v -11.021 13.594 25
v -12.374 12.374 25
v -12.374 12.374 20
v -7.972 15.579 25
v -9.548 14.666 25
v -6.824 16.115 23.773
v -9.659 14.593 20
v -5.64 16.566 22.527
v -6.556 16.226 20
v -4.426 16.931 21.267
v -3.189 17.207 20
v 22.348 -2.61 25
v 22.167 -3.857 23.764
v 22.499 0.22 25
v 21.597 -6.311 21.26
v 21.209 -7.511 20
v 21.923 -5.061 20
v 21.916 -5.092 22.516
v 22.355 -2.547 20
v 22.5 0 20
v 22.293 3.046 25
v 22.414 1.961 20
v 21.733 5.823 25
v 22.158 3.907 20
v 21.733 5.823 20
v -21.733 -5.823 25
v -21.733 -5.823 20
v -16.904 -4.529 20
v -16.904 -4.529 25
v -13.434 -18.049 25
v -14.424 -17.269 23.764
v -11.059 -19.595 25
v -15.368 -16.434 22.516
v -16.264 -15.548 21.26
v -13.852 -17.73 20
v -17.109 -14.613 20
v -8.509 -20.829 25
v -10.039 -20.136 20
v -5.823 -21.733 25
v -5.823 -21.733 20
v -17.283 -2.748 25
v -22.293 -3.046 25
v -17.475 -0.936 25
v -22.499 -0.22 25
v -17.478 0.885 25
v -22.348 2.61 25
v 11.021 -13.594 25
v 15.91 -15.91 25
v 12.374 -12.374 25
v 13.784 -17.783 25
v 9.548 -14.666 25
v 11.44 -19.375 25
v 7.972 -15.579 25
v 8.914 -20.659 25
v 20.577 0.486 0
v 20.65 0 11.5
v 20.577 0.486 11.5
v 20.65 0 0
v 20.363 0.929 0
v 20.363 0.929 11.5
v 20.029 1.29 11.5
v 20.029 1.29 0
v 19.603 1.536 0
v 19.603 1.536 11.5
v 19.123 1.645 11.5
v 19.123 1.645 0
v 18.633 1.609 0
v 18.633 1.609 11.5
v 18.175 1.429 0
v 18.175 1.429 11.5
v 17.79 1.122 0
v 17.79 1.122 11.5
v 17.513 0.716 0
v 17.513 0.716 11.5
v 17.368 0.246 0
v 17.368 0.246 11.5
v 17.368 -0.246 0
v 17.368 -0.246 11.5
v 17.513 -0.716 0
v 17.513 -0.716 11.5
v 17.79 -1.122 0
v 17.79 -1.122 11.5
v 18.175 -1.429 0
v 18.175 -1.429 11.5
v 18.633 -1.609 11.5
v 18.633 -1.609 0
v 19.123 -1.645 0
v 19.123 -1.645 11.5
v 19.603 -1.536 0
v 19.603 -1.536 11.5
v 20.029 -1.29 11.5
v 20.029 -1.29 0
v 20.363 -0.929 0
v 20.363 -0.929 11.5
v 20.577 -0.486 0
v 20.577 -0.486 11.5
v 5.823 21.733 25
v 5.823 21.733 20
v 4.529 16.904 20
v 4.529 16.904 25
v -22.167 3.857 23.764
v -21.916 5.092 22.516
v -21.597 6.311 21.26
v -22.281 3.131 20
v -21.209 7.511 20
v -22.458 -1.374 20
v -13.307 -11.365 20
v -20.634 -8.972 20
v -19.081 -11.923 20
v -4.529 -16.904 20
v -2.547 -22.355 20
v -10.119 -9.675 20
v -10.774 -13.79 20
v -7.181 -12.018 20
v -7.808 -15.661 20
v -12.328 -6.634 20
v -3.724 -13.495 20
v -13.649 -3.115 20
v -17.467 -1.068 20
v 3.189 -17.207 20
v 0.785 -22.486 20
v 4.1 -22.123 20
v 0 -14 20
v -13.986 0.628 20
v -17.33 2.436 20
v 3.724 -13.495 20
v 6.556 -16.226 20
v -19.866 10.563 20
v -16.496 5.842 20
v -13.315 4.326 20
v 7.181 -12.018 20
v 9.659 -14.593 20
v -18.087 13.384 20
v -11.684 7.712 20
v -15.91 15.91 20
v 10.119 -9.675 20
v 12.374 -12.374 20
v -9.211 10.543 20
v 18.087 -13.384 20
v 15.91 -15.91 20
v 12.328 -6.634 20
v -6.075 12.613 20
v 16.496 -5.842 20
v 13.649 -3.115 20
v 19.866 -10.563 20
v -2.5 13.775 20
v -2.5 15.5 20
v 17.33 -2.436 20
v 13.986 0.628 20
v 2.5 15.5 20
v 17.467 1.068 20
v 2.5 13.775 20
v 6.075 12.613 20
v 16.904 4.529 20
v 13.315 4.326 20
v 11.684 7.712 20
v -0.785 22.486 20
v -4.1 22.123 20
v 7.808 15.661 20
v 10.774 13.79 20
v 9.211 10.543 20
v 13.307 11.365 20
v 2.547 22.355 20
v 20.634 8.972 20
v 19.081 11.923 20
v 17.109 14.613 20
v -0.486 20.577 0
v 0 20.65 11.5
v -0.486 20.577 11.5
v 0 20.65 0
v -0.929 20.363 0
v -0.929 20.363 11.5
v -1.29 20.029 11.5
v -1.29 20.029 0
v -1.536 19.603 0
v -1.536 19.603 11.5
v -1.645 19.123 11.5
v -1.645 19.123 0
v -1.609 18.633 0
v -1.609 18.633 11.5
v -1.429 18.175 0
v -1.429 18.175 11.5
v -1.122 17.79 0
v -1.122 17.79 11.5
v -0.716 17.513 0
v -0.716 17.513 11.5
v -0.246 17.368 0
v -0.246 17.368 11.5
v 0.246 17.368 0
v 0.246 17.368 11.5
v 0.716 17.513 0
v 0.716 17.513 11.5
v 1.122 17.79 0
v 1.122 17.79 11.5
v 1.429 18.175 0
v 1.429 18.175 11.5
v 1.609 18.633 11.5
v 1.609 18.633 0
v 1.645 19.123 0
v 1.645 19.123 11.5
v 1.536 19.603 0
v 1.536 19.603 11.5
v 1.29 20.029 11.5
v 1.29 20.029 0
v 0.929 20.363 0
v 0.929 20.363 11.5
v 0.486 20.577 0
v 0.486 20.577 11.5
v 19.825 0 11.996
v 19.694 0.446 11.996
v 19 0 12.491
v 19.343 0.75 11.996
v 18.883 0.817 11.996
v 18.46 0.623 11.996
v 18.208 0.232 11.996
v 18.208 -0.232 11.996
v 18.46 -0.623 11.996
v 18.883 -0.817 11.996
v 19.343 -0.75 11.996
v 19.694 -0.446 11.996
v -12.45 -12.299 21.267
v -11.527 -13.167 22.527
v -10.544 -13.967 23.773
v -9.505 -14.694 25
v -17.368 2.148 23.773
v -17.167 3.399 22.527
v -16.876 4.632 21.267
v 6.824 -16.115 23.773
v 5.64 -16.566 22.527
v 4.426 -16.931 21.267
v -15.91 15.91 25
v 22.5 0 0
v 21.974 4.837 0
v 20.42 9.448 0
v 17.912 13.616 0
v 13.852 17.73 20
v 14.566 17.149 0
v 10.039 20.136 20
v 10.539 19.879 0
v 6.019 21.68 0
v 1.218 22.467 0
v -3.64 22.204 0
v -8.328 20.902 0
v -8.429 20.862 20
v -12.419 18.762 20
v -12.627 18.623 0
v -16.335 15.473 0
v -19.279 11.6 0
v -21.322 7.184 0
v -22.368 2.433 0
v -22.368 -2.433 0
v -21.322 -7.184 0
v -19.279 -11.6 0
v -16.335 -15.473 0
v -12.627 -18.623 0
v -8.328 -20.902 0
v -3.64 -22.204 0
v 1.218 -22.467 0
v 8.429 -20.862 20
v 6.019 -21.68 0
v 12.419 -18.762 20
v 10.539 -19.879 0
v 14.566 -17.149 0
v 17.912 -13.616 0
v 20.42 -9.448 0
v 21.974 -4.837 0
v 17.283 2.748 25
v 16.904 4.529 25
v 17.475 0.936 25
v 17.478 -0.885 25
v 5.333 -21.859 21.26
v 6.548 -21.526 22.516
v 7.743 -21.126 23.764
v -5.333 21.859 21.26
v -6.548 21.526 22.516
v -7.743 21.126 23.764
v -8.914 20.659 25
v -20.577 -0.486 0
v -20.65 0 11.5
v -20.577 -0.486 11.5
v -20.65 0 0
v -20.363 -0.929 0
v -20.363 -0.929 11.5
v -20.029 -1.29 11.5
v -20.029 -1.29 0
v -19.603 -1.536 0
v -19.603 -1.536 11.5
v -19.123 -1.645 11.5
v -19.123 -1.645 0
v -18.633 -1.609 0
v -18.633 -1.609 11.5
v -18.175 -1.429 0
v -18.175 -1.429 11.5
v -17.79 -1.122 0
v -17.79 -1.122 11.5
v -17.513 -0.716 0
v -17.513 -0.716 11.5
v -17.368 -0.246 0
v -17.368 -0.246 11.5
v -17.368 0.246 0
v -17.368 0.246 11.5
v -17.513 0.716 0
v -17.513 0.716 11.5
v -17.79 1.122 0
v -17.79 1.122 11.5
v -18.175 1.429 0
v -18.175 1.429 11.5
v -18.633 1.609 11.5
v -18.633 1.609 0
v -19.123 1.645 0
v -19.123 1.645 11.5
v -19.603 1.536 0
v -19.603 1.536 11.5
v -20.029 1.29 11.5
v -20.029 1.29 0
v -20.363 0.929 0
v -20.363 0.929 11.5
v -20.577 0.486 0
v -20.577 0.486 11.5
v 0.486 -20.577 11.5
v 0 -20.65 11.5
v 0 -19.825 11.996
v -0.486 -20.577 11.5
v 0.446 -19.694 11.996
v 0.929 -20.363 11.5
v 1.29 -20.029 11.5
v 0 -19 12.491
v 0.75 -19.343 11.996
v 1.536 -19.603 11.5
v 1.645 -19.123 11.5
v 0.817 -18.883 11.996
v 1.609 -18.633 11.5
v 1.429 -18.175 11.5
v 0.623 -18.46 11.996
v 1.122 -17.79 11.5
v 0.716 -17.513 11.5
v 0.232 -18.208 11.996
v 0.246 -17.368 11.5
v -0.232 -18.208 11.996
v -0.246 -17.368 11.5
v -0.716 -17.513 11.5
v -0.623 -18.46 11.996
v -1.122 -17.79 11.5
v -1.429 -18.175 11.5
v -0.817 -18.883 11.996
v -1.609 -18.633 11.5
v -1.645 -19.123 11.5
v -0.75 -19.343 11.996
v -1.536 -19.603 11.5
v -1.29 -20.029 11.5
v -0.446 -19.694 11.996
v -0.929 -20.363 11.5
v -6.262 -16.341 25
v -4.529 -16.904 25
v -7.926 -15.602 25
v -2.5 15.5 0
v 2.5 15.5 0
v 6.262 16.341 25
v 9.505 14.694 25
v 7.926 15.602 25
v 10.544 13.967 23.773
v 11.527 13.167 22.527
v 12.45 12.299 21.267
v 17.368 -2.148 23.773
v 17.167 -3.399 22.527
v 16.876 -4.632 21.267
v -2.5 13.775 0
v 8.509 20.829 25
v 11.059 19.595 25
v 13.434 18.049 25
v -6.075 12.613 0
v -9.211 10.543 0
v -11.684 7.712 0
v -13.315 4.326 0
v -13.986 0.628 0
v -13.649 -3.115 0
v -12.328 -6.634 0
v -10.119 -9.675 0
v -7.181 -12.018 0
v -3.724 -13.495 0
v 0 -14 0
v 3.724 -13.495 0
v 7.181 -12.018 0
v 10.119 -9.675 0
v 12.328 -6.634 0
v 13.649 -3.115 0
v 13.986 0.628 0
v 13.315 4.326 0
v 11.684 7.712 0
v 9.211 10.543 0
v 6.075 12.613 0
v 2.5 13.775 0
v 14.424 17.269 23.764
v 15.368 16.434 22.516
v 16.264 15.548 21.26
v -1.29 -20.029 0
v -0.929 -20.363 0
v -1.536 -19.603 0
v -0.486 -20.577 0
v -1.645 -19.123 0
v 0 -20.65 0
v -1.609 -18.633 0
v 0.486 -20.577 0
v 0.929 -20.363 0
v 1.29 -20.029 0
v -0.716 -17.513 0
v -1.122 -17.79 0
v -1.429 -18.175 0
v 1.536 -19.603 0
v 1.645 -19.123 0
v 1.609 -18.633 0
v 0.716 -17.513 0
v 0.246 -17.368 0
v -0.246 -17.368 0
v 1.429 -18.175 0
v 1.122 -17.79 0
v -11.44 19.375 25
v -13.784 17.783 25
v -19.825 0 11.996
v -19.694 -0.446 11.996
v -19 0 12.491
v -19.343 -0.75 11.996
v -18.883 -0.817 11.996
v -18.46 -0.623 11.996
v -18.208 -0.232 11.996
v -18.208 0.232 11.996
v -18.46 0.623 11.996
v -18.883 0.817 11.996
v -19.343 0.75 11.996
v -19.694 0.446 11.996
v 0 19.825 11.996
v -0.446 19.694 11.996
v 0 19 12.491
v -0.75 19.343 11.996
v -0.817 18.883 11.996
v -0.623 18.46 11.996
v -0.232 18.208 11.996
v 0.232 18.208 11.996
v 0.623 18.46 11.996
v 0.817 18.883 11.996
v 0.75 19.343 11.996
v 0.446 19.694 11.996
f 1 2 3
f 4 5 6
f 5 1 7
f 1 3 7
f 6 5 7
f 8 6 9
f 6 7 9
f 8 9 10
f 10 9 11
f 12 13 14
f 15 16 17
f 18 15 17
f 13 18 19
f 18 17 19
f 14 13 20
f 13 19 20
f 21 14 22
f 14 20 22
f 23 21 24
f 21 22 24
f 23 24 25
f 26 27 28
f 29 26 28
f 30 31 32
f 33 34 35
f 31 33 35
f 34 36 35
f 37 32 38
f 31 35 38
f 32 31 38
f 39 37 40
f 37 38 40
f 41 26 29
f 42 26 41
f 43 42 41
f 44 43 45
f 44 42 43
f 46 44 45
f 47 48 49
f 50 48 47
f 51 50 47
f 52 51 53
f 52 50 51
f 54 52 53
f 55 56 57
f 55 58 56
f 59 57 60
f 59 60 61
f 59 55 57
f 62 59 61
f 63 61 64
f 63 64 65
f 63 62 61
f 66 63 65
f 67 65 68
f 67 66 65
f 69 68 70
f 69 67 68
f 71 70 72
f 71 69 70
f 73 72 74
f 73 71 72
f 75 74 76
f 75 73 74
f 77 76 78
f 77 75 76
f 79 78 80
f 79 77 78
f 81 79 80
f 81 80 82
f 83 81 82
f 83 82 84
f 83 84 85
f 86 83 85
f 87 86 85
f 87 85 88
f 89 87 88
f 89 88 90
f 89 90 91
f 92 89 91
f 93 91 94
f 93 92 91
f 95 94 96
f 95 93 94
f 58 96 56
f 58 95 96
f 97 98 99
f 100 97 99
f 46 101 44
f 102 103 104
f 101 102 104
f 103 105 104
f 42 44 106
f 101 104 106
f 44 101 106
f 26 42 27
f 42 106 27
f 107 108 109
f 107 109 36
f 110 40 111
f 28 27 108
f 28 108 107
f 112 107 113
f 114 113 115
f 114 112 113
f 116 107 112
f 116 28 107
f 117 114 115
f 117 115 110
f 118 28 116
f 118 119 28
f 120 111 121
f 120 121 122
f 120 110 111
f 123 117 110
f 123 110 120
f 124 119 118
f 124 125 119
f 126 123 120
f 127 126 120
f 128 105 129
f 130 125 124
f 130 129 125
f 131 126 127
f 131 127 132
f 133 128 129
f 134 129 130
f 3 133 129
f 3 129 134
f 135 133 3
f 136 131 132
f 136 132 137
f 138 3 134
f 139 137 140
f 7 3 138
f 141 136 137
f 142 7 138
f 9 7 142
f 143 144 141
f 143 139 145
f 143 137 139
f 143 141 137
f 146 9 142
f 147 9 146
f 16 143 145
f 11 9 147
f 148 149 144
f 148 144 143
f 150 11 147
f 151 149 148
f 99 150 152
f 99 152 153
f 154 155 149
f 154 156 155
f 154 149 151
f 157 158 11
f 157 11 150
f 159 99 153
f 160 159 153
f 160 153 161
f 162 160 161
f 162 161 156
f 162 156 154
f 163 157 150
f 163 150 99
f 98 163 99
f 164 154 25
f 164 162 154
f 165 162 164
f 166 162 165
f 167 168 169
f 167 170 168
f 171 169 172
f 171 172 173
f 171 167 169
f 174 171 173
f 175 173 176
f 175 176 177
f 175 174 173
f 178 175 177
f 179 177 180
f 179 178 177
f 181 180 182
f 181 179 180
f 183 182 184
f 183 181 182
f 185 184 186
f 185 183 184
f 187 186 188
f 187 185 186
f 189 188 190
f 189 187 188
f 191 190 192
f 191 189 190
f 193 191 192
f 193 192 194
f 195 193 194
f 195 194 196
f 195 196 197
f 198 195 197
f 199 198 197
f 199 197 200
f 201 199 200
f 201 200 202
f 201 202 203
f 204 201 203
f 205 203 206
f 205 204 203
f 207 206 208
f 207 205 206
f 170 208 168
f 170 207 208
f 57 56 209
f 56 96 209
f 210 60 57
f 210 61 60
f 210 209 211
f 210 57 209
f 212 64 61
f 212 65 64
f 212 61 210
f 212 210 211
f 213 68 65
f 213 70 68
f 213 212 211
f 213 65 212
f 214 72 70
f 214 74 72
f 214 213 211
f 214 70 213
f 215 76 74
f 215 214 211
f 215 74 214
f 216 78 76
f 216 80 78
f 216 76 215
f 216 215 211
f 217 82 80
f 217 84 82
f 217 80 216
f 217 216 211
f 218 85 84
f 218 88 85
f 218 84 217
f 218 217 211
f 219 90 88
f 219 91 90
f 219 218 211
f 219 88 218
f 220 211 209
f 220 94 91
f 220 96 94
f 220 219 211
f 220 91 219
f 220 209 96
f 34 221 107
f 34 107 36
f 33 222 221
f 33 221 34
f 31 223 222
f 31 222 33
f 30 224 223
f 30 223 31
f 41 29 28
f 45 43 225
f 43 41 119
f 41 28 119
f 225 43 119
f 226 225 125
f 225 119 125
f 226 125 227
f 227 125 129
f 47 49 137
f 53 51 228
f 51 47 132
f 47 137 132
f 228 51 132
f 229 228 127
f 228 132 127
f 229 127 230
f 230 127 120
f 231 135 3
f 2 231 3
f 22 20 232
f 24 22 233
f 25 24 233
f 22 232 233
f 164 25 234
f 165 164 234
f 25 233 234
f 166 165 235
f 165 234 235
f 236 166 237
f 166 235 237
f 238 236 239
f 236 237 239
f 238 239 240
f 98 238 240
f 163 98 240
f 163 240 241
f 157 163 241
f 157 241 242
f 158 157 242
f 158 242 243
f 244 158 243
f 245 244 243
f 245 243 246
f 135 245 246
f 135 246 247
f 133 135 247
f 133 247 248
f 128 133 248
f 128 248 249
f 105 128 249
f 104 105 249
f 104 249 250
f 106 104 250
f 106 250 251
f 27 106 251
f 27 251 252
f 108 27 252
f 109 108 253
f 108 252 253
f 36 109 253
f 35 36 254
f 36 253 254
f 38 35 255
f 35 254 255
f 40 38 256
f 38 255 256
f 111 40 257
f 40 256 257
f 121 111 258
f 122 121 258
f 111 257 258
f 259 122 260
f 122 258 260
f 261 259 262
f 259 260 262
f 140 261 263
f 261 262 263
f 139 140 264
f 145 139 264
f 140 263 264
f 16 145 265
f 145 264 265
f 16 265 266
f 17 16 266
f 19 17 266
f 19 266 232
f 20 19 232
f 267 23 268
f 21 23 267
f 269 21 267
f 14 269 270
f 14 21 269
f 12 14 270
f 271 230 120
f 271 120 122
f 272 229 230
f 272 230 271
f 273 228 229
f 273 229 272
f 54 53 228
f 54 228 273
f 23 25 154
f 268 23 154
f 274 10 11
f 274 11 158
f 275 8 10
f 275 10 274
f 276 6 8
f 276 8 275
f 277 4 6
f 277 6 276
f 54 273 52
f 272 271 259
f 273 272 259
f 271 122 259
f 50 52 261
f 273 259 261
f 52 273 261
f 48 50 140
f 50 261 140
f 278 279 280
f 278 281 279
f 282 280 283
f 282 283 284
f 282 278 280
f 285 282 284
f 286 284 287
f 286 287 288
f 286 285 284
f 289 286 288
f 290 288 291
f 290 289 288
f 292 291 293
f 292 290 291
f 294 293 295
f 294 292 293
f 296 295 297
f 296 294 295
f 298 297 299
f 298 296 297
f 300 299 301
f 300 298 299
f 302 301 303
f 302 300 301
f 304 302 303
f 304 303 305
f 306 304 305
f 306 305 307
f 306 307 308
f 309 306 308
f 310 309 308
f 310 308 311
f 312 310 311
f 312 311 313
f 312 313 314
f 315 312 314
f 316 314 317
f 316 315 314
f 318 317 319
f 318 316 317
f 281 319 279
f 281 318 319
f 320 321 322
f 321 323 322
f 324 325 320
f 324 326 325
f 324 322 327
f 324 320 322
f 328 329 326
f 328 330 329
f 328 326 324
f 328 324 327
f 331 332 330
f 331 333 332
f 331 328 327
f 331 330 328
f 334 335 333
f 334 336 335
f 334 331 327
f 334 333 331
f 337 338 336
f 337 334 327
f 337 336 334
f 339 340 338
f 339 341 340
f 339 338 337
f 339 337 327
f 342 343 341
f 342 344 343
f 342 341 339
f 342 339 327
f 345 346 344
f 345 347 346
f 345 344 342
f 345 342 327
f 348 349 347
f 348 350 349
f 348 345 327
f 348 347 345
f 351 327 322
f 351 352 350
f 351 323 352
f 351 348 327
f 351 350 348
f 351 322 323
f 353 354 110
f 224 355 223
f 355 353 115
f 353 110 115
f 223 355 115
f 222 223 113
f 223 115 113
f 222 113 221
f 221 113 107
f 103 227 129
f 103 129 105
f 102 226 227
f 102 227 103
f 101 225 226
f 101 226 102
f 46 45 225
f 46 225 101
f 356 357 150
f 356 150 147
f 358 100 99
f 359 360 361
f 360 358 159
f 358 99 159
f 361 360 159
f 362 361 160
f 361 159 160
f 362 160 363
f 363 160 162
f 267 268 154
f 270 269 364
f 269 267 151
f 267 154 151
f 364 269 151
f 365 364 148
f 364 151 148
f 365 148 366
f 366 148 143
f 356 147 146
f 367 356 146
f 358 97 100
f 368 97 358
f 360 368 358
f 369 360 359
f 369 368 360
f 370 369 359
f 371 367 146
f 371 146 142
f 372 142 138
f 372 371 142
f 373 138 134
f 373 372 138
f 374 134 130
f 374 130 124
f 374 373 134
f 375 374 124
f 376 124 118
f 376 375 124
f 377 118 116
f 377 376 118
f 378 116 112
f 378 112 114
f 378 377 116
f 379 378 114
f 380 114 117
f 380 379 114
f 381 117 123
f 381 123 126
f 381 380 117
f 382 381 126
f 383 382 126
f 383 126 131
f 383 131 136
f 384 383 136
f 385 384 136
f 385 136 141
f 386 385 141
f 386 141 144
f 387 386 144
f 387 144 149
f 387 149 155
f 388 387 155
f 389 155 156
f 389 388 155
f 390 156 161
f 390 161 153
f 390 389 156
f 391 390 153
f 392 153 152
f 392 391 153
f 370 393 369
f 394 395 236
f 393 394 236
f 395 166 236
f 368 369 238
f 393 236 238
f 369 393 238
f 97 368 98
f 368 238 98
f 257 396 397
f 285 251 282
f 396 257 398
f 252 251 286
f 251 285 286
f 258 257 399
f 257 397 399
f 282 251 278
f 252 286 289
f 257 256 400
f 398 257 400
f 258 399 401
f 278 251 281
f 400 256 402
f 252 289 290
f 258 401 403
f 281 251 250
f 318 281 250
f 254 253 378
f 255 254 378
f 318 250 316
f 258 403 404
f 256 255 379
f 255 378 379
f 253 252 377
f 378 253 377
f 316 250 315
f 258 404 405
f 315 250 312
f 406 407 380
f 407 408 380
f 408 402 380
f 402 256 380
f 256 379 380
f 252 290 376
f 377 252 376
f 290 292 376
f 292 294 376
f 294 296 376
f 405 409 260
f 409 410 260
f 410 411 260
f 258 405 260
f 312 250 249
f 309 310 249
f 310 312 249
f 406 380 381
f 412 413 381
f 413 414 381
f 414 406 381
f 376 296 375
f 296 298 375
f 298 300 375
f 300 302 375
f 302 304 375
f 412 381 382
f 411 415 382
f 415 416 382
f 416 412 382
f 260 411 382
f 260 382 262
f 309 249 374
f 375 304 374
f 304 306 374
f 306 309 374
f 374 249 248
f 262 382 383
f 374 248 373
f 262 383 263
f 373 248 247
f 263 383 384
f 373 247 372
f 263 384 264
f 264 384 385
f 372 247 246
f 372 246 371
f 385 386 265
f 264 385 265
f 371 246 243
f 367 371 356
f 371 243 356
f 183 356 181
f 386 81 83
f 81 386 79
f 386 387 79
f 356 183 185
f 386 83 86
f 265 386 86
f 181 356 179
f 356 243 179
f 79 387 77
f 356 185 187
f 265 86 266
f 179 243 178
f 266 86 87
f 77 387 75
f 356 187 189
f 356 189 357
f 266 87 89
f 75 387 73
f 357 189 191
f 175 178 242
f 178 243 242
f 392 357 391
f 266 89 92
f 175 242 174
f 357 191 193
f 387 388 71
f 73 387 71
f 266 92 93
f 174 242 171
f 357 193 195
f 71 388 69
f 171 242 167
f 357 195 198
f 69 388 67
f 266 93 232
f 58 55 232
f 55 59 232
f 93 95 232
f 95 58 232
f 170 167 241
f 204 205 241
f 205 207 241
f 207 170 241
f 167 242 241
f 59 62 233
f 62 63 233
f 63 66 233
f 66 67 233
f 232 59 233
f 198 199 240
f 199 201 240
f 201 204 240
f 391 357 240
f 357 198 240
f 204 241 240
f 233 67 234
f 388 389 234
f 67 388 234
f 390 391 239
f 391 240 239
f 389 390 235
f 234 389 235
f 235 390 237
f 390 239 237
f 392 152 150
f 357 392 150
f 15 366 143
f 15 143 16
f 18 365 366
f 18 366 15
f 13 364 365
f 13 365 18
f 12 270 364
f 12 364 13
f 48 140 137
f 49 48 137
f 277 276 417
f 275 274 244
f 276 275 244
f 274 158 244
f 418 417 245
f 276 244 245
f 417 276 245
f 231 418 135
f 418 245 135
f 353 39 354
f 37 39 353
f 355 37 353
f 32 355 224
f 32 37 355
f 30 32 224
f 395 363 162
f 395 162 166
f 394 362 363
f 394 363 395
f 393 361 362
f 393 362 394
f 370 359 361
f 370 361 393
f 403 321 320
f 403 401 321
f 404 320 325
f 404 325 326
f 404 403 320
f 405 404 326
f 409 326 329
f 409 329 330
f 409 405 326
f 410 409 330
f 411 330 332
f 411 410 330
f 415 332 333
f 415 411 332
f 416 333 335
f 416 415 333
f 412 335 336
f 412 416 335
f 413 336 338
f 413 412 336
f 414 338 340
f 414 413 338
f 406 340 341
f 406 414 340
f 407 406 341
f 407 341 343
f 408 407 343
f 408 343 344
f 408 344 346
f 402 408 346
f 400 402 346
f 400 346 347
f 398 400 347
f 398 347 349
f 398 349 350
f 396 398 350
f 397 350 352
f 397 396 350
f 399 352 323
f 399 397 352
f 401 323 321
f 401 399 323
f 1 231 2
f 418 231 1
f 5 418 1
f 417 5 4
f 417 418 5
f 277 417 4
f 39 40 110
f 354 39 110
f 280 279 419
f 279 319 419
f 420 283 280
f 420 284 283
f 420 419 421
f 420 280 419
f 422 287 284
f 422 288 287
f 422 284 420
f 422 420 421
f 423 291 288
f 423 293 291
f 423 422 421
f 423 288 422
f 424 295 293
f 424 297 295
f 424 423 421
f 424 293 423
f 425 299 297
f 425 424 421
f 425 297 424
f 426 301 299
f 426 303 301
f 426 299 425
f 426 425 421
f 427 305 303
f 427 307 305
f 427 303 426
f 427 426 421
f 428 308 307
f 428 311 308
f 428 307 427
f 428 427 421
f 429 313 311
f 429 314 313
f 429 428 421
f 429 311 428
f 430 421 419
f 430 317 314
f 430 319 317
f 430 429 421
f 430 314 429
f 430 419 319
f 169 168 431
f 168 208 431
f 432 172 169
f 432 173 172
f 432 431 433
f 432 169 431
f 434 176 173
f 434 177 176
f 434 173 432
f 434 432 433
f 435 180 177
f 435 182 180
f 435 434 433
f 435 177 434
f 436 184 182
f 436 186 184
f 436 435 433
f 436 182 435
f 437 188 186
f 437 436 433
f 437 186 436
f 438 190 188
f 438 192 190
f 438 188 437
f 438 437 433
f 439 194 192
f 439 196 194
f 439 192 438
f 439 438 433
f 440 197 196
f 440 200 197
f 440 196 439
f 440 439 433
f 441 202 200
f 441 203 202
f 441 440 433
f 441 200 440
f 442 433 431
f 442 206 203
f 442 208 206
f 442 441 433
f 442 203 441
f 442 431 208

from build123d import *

# Parameters (mm, degrees)
SKETCH1_R                    = 22.5
BOSS_EXTRUDE1_DEPTH          = 20
BOSS_EXTRUDE2_DEPTH          = 5
CHAMFER2_SIZE                = 5
CIRPATTERN1_COUNT            = 6
CHAMFER2_OF_CIRPATTERN1_SIZE = 5
CIRPATTERN2_COUNT            = 4


with BuildPart() as part:
    # Sketch1 → Boss-Extrude1 (new body)
    with BuildSketch(Plane.XY):
        Circle(SKETCH1_R)
        with BuildLine():
            Line((2.5, 15.5), (-2.5, 15.5))
            Line((-2.5, 15.5), (-2.5, 13.774977314))
            ThreePointArc((-2.5, 13.774977314), (0, -14), (2.5, 13.774977314))
            Line((2.5, 13.774977314), (2.5, 15.5))
        make_face(mode=Mode.SUBTRACT)
    extrude(amount=BOSS_EXTRUDE1_DEPTH)

    # Sketch2 → Boss-Extrude2 (add)
    with BuildSketch(Plane.XY.offset(20)):
        with BuildLine():
            Line((-3.189121696, 17.206960882), (-4.100299324, 22.12323542))
            ThreePointArc((-4.100299324, 22.12323542), (-10.476326707, 19.912221843), (-15.909902577, 15.909902577))
            Line((-15.909902577, 15.909902577), (-12.374368671, 12.374368671))
            ThreePointArc((-12.374368671, 12.374368671), (-8.148254106, 15.487283656), (-3.189121696, 17.206960882))
        make_face()
    boss_extrude2 = extrude(amount=BOSS_EXTRUDE2_DEPTH)

    # Chamfer2
    chamfer2_edges = [part.edges().sort_by_distance(p)[0] for p in [
        (-3.64471051, 19.665098151, 25),
    ]]
    chamfer(chamfer2_edges, length=CHAMFER2_SIZE - 0.0001)  # a hair under: the kernel refuses the full size

    # CirPattern1: Boss-Extrude2 ×6 about axis
    cirpattern1_axis = Axis((0, 0, 0), (0, 0, 1))
    for i in range(1, CIRPATTERN1_COUNT):
        add(boss_extrude2.rotate(cirpattern1_axis, i * 360 / CIRPATTERN1_COUNT))

    # Chamfer2 of CirPattern1
    chamfer2_of_cirpattern1_edges = [part.edges().sort_by_distance(p)[0] for p in [
        (-18.852829822, 6.676137185, 25),
        (-15.208119312, -12.988960967, 25),
        (3.64471051, -19.665098151, 25),
        (18.852829822, -6.676137185, 25),
        (15.208119312, 12.988960967, 25),
    ]]
    chamfer(chamfer2_of_cirpattern1_edges, length=CHAMFER2_OF_CIRPATTERN1_SIZE - 0.0001)  # a hair under: the kernel refuses the full size

    # Sketch4 → M4 Tapped Hole1 (revolve, cut)
    with BuildSketch(Plane(origin=(0, 19, 0), x_dir=(0, 1, 0), z_dir=(1, 0, 0))):
        Polygon((0, 0), (0, 12.491420021), (1.65, 11.5), (1.65, 0), align=None)
    m4_tapped_hole1 = revolve(axis=Axis((0, 19, -6.35), (0, 0, 1)), mode=Mode.SUBTRACT)

    # CirPattern2: M4 Tapped Hole1 ×4 about axis
    cirpattern2_axis = Axis((0, 0, 0), (0, 0, 1))
    for i in range(1, CIRPATTERN2_COUNT):
        add(m4_tapped_hole1.rotate(cirpattern2_axis, i * 360 / CIRPATTERN2_COUNT), mode=Mode.SUBTRACT)


solid = part.part
